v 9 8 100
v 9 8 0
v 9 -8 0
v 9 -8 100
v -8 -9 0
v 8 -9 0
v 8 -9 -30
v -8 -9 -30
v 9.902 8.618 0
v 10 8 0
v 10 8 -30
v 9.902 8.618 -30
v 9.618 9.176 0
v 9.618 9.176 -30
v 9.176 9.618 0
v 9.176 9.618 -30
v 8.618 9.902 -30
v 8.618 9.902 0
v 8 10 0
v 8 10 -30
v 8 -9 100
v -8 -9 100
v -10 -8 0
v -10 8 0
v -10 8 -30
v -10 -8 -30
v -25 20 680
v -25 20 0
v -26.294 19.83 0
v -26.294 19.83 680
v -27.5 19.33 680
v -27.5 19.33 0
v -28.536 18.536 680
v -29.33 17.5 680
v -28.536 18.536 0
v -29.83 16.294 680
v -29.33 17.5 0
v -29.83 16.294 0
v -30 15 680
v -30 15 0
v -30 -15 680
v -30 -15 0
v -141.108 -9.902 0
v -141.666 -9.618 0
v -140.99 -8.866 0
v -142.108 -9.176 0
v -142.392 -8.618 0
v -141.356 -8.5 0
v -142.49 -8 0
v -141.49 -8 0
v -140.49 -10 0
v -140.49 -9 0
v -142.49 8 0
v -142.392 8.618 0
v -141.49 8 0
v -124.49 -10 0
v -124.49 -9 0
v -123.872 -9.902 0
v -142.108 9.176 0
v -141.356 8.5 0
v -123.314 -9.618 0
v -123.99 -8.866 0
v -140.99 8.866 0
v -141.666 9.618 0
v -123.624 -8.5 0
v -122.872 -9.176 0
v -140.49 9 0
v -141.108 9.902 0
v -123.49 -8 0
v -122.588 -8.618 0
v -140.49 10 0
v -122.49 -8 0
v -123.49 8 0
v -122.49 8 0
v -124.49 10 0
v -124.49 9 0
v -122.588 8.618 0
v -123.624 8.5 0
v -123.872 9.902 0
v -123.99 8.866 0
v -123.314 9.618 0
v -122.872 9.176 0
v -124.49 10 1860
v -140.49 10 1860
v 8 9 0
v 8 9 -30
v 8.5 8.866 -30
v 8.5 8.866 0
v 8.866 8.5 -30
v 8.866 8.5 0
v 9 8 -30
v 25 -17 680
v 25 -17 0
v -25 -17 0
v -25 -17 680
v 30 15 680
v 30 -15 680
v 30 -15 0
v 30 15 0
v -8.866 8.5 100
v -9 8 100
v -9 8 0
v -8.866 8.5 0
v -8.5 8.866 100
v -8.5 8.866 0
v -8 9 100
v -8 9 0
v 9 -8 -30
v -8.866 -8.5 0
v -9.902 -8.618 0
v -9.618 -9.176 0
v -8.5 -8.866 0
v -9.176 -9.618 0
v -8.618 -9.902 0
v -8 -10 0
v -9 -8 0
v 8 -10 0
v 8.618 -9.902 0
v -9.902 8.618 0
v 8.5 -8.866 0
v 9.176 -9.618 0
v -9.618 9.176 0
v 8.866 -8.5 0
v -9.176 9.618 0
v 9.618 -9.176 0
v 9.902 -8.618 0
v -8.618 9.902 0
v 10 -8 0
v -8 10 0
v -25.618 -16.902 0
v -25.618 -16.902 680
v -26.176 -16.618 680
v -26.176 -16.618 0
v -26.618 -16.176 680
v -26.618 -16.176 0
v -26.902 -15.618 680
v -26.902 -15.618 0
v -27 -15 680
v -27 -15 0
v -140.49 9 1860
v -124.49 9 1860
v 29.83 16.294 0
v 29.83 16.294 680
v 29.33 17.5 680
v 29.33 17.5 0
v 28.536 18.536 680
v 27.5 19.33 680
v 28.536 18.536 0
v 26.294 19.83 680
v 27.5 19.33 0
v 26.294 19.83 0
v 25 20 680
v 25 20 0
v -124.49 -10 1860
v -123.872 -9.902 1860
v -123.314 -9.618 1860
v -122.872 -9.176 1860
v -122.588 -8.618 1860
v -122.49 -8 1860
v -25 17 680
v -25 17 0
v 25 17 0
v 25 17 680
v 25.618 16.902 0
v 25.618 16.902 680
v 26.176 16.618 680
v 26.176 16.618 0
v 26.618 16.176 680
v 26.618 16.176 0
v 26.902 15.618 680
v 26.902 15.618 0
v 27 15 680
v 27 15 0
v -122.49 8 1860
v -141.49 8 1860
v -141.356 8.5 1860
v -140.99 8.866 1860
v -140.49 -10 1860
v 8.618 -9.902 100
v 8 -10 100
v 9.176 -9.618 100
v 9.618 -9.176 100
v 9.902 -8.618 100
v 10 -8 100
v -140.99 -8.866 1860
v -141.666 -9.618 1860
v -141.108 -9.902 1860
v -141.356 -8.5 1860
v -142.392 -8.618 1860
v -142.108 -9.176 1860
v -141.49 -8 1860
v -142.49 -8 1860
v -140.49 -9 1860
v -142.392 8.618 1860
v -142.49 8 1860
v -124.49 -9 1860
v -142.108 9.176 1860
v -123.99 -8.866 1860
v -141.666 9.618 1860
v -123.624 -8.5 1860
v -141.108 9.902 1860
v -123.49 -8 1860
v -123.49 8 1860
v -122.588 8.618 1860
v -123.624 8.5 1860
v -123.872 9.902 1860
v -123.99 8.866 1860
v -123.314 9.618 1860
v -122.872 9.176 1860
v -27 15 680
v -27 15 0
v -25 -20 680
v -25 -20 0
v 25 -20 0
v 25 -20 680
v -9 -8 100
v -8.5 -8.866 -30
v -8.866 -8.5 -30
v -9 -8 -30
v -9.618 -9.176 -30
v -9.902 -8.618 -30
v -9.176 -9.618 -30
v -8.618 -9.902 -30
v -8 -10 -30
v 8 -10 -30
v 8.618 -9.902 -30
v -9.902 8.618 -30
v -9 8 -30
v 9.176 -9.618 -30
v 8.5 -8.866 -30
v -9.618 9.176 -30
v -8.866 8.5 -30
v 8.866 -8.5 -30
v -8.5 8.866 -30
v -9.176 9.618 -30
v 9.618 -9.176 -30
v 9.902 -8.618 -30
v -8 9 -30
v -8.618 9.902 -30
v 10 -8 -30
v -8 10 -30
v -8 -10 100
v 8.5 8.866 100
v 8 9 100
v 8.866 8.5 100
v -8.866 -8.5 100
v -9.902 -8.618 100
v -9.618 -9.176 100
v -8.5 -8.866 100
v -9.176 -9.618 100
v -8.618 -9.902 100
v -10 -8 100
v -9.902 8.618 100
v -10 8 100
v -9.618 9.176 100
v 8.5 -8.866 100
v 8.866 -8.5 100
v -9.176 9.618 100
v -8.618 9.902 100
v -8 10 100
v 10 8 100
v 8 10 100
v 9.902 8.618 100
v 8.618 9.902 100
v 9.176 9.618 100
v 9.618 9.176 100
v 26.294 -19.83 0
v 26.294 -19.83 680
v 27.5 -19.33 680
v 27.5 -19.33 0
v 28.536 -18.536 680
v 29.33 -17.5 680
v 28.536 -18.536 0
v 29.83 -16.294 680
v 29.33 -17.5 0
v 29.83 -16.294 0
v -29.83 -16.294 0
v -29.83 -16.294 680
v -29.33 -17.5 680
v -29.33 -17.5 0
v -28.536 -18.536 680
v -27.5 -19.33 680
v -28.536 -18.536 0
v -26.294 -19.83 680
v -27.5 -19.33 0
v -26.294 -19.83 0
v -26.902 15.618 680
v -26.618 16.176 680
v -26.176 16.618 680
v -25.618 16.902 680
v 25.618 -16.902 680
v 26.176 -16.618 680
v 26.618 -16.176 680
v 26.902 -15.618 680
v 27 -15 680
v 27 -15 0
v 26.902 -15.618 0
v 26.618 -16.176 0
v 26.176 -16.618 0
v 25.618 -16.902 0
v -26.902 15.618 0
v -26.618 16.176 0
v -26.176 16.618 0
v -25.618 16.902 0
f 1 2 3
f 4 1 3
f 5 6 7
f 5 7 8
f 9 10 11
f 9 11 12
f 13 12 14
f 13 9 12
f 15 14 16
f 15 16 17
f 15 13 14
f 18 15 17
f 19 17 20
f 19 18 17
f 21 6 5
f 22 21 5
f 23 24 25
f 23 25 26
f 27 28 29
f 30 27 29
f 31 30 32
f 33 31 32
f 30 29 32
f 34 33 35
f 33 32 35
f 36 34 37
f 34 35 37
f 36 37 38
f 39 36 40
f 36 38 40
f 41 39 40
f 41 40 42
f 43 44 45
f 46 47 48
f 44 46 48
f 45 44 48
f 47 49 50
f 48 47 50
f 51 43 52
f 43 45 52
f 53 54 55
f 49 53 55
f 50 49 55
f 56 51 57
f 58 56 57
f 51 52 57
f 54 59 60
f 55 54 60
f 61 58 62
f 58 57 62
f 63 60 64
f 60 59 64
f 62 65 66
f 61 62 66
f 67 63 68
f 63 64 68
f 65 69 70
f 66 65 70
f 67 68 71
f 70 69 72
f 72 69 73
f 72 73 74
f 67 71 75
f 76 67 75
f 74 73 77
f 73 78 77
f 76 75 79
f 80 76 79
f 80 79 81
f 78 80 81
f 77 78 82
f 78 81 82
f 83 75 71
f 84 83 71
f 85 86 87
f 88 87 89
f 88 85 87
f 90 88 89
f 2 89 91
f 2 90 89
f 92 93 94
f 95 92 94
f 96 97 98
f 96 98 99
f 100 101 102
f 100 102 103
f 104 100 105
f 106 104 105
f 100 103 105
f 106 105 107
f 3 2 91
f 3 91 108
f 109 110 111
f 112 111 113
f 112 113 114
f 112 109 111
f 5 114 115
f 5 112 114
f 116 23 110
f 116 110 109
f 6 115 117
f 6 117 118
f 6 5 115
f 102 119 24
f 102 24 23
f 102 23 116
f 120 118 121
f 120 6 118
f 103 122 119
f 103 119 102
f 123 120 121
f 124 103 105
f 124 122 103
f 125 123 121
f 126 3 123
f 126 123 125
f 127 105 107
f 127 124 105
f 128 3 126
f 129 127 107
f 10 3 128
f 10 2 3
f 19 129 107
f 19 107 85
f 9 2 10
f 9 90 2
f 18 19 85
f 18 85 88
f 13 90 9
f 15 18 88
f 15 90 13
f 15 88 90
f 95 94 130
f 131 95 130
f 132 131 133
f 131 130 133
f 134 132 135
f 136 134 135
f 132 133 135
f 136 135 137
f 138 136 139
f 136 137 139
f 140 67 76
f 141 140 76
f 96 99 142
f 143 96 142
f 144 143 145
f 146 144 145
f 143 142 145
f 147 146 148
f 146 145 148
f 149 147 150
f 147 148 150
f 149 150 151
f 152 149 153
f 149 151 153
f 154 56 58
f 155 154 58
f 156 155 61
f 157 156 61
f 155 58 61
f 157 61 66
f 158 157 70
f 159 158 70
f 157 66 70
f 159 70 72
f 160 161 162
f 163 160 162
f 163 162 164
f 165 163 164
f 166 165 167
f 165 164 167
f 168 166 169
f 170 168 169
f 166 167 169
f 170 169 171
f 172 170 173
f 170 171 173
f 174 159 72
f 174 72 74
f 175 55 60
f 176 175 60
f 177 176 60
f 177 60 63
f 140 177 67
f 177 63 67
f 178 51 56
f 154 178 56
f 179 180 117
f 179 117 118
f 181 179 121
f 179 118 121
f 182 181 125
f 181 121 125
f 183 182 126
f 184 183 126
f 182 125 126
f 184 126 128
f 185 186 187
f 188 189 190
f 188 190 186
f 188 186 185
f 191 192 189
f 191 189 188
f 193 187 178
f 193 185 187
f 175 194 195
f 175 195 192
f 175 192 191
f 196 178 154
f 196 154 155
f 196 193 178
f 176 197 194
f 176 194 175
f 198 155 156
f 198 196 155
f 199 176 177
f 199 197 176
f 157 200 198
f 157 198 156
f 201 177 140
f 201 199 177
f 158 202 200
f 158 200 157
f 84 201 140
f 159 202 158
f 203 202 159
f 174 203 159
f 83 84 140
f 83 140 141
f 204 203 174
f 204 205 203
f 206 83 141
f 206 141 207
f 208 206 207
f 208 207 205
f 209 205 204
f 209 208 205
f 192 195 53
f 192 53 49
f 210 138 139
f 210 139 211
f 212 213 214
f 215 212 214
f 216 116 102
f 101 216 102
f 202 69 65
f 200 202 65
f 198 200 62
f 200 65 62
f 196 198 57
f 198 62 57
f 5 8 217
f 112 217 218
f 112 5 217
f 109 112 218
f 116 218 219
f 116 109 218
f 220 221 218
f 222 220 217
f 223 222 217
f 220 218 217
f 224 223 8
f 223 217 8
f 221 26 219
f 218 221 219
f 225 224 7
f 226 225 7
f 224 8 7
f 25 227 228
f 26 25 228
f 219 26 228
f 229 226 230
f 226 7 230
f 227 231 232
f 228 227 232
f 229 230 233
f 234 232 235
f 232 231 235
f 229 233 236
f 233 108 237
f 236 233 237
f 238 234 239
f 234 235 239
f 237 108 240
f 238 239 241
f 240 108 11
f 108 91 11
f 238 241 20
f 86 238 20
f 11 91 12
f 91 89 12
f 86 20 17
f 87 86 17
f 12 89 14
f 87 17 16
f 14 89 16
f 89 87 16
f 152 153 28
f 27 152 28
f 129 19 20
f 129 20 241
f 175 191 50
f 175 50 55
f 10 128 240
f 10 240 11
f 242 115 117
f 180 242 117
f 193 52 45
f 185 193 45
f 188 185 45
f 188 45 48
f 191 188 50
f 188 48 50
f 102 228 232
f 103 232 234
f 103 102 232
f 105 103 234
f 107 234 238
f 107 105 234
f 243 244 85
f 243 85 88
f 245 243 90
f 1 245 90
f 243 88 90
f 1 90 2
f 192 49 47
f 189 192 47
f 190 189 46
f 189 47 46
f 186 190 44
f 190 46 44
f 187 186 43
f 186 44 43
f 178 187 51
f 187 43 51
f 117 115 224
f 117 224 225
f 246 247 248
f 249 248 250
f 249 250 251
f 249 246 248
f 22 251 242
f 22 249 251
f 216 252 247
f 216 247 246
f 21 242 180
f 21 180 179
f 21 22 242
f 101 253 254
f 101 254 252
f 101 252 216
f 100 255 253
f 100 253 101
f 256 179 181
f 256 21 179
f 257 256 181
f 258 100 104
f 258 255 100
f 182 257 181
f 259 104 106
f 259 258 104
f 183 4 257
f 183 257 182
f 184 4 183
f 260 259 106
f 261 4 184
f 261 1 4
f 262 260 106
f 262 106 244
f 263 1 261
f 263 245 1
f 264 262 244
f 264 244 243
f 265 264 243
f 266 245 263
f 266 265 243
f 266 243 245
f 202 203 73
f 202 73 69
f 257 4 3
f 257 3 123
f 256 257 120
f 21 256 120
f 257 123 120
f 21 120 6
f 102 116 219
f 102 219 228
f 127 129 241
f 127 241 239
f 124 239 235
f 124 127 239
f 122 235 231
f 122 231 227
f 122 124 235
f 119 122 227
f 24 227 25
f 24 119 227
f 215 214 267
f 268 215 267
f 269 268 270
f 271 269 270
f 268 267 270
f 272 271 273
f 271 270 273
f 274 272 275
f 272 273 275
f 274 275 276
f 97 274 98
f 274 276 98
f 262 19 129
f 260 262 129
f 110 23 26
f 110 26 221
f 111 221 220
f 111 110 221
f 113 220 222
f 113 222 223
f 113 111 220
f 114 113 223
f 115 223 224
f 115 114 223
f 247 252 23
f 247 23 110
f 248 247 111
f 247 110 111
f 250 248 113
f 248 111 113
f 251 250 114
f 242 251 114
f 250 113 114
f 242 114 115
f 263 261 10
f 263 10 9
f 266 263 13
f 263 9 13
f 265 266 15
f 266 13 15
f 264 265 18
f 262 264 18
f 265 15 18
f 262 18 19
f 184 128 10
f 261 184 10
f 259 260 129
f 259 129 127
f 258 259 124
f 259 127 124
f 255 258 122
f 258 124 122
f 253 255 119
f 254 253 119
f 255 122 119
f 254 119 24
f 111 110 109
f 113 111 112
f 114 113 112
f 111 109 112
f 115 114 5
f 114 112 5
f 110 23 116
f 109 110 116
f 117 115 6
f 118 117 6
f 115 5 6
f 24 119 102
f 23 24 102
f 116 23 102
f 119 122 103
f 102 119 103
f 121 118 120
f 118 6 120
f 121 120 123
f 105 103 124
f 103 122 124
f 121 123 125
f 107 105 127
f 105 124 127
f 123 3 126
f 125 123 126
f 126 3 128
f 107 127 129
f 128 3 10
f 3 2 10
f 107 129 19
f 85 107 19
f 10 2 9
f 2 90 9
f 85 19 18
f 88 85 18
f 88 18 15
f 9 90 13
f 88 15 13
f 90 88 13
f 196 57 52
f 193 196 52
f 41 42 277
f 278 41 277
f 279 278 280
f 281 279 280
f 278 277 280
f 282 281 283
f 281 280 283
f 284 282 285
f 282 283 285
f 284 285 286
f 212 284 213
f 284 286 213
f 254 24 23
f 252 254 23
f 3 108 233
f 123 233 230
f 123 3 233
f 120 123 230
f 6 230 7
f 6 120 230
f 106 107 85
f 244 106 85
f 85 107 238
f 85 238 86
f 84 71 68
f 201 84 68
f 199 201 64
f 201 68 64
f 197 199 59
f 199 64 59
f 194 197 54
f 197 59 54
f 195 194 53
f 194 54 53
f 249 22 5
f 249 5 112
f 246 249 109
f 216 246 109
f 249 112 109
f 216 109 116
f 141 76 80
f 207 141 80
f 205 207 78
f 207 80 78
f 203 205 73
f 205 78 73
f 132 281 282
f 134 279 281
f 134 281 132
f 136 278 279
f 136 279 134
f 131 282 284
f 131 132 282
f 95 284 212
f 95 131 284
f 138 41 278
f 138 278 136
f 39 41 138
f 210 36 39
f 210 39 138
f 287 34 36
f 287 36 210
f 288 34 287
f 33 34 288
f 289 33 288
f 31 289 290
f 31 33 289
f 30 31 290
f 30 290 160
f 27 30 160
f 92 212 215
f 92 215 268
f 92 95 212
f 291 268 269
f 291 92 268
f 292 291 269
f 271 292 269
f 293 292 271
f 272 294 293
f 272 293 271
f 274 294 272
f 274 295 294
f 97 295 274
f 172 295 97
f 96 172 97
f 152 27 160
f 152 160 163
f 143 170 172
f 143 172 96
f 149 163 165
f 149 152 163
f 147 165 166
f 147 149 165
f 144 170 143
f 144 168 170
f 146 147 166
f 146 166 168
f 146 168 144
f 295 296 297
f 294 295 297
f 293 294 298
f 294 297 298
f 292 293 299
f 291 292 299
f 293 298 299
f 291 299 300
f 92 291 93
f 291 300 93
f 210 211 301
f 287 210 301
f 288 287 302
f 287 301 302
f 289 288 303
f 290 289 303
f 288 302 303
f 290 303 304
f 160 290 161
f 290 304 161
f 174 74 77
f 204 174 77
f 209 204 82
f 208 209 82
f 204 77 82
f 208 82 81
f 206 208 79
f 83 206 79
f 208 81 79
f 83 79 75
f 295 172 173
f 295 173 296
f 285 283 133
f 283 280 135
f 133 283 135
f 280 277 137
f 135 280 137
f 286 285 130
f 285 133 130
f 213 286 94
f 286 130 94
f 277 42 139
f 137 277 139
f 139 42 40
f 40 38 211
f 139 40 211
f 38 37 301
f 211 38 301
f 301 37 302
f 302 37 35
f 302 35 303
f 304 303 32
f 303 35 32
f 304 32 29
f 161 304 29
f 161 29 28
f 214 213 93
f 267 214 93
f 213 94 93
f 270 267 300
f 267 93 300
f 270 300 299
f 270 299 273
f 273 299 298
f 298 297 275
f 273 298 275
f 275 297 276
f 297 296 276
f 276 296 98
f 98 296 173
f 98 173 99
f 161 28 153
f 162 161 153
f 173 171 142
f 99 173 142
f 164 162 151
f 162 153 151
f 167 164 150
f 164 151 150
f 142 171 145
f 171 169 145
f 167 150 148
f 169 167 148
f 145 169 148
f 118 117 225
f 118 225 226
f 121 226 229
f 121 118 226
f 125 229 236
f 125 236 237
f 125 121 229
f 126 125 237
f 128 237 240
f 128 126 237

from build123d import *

# Parameters (mm, degrees)
F1_DEPTH = 680
F3_DEPTH = 1860
F5_DEPTH = 100
F7_DEPTH = 30


with BuildPart() as f1:
    # F0 (on Top) → F1 (new body)
    with BuildSketch(Plane.XY):
        with BuildLine():
            ThreePointArc((30, 15), (28.535534, 18.535534), (25, 20))
            Line((25, 20), (-25, 20))
            ThreePointArc((-25, 20), (-28.535534, 18.535534), (-30, 15))
            Line((-30, 15), (-30, -15))
            ThreePointArc((-30, -15), (-28.535534, -18.535534), (-25, -20))
            Line((-25, -20), (25, -20))
            ThreePointArc((25, -20), (28.535534, -18.535534), (30, -15))
            Line((30, -15), (30, 15))
        make_face()
        with BuildLine():
            Line((-25, 17), (25, 17))
            ThreePointArc((25, 17), (26.414214, 16.414214), (27, 15))
            Line((27, 15), (27, -15))
            ThreePointArc((27, -15), (26.414214, -16.414214), (25, -17))
            Line((25, -17), (-25, -17))
            ThreePointArc((-25, -17), (-26.414214, -16.414214), (-27, -15))
            Line((-27, -15), (-27, 15))
            ThreePointArc((-27, 15), (-26.414214, 16.414214), (-25, 17))
        make_face(mode=Mode.SUBTRACT)
    extrude(amount=F1_DEPTH)


with BuildPart() as f3:
    # F2 (on Top) → F3 (new body)
    with BuildSketch(Plane.XY):
        with BuildLine():
            ThreePointArc((-122.490022, 8), (-123.075808, 9.414214), (-124.490022, 10))
            Line((-124.490022, 10), (-140.490022, 10))
            ThreePointArc((-140.490022, 10), (-141.904235, 9.414214), (-142.490022, 8))
            Line((-142.490022, 8), (-142.490022, -8))
            ThreePointArc((-142.490022, -8), (-141.904235, -9.414214), (-140.490022, -10))
            Line((-140.490022, -10), (-124.490022, -10))
            ThreePointArc((-124.490022, -10), (-123.075808, -9.414214), (-122.490022, -8))
            Line((-122.490022, -8), (-122.490022, 8))
        make_face()
        with BuildLine():
            Line((-140.490022, 9), (-124.490022, 9))
            ThreePointArc((-124.490022, 9), (-123.782915, 8.707107), (-123.490022, 8))
            Line((-123.490022, 8), (-123.490022, -8))
            ThreePointArc((-123.490022, -8), (-123.782915, -8.707107), (-124.490022, -9))
            Line((-124.490022, -9), (-140.490022, -9))
            ThreePointArc((-140.490022, -9), (-141.197129, -8.707107), (-141.490022, -8))
            Line((-141.490022, -8), (-141.490022, 8))
            ThreePointArc((-141.490022, 8), (-141.197129, 8.707107), (-140.490022, 9))
        make_face(mode=Mode.SUBTRACT)
    extrude(amount=F3_DEPTH)


with BuildPart() as f5:
    # F4 (on Top) → F5 (new body)
    with BuildSketch(Plane.XY):
        with BuildLine():
            ThreePointArc((10, 8), (9.414214, 9.414214), (8, 10))
            Line((8, 10), (-8, 10))
            ThreePointArc((-8, 10), (-9.414214, 9.414214), (-10, 8))
            Line((-10, 8), (-10, -8))
            ThreePointArc((-10, -8), (-9.414214, -9.414214), (-8, -10))
            Line((-8, -10), (8, -10))
            ThreePointArc((8, -10), (9.414214, -9.414214), (10, -8))
            Line((10, -8), (10, 8))
        make_face()
        with BuildLine():
            Line((-8, 9), (8, 9))
            ThreePointArc((8, 9), (8.707107, 8.707107), (9, 8))
            Line((9, 8), (9, -8))
            ThreePointArc((9, -8), (8.707107, -8.707107), (8, -9))
            Line((8, -9), (-8, -9))
            ThreePointArc((-8, -9), (-8.707107, -8.707107), (-9, -8))
            Line((-9, -8), (-9, 8))
            ThreePointArc((-9, 8), (-8.707107, 8.707107), (-8, 9))
        make_face(mode=Mode.SUBTRACT)
    extrude(amount=F5_DEPTH)


with BuildPart() as f7:
    # F6 (on Top) → F7 (new body)
    with BuildSketch(Plane.XY):
        with BuildLine():
            Line((-8, -10), (8, -10))
            ThreePointArc((8, -10), (9.414214, -9.414214), (10, -8))
            Line((10, -8), (10, 8))
            ThreePointArc((10, 8), (9.414214, 9.414214), (8, 10))
            Line((8, 10), (-8, 10))
            ThreePointArc((-8, 10), (-9.414214, 9.414214), (-10, 8))
            Line((-10, 8), (-10, -8))
            ThreePointArc((-10, -8), (-9.414214, -9.414214), (-8, -10))
        make_face()
        with BuildLine():
            Line((-9, -8), (-9, 8))
            ThreePointArc((-9, 8), (-8.707107, 8.707107), (-8, 9))
            Line((-8, 9), (8, 9))
            ThreePointArc((8, 9), (8.707107, 8.707107), (9, 8))
            Line((9, 8), (9, -8))
            ThreePointArc((9, -8), (8.707107, -8.707107), (8, -9))
            Line((8, -9), (-8, -9))
            ThreePointArc((-8, -9), (-8.707107, -8.707107), (-9, -8))
        make_face(mode=Mode.SUBTRACT)
    extrude(amount=-F7_DEPTH)


solid = Compound([f1.part, f3.part, f5.part, f7.part])
